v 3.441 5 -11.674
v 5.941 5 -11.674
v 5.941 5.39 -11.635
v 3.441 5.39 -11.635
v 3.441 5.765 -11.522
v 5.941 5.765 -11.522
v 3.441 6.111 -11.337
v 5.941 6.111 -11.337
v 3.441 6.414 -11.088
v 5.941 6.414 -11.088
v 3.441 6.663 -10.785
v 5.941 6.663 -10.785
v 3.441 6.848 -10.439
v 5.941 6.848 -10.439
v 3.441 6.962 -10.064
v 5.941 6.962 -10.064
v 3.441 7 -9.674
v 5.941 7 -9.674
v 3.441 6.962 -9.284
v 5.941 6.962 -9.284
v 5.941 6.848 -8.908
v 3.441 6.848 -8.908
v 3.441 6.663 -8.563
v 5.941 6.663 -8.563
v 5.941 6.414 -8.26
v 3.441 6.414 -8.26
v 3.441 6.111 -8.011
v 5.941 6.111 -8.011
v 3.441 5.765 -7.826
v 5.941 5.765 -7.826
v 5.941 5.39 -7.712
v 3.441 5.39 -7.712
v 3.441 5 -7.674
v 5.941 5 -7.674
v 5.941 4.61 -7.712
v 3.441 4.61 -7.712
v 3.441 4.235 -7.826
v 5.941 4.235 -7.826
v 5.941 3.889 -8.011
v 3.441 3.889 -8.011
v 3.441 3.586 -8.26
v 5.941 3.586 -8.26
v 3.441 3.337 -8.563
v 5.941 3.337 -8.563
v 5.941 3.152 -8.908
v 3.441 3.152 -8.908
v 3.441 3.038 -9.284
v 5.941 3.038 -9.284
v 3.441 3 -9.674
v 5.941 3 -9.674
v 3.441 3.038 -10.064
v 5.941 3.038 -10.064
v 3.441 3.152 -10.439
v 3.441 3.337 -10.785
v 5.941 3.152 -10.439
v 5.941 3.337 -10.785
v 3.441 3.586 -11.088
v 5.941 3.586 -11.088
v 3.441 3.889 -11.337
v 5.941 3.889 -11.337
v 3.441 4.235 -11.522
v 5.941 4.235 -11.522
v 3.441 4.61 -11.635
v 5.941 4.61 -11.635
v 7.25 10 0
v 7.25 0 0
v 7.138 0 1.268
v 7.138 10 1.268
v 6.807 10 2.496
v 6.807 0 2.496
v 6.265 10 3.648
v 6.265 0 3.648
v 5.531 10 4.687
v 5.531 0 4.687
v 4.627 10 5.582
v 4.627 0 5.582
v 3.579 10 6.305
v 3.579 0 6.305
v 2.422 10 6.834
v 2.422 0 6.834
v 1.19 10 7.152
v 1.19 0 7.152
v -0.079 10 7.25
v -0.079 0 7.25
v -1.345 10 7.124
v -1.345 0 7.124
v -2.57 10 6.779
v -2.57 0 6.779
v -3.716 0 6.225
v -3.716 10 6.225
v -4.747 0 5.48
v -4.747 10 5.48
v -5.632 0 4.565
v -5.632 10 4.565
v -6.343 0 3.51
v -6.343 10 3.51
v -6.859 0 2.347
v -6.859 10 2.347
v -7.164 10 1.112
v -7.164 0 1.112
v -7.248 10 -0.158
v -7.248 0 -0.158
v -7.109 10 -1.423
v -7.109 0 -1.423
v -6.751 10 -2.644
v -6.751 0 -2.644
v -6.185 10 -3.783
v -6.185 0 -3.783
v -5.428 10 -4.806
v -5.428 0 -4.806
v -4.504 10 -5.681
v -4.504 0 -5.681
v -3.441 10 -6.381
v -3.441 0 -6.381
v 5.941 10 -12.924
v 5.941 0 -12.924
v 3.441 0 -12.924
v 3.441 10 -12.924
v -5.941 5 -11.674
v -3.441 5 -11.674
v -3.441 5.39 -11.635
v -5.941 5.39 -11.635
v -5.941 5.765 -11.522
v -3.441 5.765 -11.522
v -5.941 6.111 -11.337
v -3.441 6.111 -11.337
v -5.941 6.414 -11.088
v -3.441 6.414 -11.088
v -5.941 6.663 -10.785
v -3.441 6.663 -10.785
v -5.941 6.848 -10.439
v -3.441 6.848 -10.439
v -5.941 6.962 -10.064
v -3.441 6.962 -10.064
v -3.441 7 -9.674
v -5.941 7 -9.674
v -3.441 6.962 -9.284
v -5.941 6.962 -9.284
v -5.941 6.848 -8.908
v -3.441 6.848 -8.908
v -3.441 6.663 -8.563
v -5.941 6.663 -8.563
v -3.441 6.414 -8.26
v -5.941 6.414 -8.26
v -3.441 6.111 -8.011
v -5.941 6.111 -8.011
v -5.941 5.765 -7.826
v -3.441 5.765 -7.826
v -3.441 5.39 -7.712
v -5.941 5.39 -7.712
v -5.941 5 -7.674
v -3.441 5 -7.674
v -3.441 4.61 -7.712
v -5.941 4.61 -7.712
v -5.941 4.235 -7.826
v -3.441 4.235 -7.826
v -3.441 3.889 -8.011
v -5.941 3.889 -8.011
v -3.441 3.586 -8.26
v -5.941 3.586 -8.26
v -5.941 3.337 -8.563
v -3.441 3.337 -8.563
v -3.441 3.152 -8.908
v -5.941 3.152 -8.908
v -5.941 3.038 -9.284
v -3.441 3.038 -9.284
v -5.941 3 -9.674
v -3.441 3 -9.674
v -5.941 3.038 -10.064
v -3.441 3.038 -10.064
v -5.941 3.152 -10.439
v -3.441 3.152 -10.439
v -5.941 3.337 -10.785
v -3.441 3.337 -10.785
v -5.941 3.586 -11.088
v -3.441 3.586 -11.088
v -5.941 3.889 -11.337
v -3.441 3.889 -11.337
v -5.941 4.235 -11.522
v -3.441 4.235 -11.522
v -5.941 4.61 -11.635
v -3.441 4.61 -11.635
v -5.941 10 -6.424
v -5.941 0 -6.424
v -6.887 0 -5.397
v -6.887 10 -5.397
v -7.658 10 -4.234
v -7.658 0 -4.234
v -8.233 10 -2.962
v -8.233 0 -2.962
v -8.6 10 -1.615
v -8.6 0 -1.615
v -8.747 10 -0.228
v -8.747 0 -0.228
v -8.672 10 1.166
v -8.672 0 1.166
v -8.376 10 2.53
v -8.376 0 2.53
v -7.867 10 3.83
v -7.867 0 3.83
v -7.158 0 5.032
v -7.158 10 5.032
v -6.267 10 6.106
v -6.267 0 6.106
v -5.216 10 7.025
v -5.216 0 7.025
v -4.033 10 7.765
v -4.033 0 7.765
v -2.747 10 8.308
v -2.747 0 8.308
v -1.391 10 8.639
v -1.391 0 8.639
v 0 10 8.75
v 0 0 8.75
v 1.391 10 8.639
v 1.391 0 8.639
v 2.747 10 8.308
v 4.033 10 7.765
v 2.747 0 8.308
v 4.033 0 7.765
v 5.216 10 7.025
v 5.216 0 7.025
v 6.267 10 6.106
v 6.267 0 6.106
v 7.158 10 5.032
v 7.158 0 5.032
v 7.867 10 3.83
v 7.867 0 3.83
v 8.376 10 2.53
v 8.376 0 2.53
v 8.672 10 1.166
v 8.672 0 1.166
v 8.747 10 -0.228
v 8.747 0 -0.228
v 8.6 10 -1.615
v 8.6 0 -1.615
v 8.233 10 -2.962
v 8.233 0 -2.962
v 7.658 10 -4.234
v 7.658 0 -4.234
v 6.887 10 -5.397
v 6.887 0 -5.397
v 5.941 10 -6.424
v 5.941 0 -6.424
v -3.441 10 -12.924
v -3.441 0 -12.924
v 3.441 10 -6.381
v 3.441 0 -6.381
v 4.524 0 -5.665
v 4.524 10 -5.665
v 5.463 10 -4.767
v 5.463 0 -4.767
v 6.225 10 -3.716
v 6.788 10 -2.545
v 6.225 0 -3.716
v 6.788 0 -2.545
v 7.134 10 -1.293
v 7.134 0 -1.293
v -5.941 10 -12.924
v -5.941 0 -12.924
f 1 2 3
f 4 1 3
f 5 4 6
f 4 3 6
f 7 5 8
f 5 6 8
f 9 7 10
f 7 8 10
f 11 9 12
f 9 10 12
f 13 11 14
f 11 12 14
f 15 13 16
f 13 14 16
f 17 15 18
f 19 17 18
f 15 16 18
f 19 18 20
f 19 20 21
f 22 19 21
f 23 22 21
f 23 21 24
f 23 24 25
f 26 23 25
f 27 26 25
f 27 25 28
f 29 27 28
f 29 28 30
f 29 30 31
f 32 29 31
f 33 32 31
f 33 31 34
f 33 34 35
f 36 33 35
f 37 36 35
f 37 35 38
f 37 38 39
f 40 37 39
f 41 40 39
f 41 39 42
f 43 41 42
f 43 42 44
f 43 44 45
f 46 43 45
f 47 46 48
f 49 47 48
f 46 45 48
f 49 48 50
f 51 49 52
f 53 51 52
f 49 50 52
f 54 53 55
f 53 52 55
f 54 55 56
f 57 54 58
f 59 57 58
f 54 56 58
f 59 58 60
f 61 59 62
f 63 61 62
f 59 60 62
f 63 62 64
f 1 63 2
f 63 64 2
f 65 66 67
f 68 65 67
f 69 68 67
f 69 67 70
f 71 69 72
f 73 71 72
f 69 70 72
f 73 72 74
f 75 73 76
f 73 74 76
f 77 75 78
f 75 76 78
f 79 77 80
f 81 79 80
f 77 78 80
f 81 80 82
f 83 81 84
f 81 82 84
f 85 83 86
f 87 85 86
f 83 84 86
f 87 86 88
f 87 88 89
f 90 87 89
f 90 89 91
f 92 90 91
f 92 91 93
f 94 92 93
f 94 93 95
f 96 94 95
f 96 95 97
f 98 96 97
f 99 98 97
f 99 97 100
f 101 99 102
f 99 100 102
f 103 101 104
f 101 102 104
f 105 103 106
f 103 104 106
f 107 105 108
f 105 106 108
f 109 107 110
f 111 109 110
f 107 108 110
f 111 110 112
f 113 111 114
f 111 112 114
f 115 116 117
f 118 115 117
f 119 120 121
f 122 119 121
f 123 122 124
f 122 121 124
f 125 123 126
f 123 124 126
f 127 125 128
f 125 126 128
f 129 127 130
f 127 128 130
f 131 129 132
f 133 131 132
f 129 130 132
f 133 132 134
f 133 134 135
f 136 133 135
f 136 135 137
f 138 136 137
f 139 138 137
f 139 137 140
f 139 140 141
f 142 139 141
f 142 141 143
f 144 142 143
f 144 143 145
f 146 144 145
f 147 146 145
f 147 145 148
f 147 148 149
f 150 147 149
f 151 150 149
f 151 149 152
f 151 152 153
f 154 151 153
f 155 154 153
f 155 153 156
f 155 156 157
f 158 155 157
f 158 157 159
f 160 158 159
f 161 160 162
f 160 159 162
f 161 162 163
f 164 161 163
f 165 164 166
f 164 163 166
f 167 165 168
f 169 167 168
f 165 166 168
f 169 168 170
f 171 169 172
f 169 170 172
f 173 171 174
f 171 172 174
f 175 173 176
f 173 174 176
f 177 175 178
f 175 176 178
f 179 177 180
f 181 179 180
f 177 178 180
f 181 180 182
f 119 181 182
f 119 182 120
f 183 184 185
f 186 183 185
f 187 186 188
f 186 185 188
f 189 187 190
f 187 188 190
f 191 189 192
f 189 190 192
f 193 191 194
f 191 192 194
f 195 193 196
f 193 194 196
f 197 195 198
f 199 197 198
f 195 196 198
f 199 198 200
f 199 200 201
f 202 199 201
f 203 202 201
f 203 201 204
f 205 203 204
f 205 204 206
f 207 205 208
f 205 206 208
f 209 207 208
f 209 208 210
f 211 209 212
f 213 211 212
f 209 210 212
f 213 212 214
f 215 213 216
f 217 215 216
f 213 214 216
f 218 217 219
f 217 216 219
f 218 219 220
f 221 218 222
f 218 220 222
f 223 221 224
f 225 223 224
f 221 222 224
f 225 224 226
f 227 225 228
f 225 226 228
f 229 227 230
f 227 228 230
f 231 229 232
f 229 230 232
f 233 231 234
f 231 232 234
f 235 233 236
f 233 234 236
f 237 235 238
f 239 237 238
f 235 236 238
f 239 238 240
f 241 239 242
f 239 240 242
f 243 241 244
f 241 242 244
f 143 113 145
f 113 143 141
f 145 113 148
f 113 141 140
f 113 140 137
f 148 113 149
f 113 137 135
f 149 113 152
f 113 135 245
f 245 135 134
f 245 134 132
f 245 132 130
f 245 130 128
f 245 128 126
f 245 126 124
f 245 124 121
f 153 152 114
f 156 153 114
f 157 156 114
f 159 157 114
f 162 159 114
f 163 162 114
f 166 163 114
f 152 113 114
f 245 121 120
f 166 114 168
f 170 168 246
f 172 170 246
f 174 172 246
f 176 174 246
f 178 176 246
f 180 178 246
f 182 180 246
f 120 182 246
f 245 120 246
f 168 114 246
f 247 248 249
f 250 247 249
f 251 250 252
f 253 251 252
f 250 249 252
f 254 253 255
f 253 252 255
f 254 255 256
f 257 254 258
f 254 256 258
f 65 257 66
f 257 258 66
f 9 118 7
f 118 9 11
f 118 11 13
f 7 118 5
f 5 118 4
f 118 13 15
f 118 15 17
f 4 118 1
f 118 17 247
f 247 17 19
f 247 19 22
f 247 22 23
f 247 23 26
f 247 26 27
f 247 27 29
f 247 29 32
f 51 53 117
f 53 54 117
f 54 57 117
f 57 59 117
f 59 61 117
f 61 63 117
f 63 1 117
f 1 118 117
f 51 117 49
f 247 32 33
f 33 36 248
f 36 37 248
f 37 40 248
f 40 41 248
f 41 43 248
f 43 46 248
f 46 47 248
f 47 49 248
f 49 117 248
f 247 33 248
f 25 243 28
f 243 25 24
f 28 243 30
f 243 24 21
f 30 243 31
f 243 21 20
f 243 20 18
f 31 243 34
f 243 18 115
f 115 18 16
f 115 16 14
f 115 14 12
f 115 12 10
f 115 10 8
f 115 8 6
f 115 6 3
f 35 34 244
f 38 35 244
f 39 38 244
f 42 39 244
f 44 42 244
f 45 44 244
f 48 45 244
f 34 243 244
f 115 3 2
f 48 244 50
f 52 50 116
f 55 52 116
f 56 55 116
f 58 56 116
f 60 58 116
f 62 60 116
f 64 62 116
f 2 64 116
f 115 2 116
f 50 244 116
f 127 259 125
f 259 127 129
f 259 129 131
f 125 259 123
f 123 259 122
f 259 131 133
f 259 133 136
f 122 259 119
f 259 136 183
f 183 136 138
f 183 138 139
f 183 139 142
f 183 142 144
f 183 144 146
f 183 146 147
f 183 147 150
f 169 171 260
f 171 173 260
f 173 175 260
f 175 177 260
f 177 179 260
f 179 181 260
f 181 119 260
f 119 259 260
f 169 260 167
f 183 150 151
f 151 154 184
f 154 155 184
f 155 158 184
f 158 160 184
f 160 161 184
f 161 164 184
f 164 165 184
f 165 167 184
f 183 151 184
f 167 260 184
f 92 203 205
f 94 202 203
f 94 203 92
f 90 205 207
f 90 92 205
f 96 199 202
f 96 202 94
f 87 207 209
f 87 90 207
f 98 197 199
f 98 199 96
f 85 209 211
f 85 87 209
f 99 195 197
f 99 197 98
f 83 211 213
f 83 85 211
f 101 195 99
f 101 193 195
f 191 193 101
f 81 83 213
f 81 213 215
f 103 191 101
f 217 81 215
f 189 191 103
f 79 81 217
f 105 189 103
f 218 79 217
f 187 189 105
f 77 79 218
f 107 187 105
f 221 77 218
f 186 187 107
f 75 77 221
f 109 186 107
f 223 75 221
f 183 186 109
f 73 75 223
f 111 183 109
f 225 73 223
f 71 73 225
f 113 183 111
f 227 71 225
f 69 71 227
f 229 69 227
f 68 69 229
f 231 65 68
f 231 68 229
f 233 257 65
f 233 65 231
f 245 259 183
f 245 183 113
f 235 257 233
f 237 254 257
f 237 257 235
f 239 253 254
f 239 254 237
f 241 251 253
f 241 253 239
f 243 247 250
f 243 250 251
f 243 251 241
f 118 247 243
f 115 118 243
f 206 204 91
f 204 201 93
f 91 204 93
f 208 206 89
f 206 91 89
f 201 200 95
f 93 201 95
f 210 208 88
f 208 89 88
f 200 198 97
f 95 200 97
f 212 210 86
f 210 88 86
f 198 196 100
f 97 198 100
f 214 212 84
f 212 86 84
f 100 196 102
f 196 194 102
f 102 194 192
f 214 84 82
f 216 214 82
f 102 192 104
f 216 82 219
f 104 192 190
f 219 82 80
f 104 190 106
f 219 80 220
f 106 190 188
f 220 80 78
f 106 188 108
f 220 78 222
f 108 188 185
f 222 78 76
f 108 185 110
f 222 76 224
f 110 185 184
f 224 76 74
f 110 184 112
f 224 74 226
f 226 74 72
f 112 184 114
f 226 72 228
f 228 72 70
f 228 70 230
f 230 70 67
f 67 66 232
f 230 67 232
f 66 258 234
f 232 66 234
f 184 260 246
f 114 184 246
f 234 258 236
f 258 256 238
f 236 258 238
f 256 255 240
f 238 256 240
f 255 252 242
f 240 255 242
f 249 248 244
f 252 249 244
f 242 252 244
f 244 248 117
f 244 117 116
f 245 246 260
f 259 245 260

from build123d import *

# Parameters (mm, degrees)
BOSS_EXTRUDE1_DEPTH = 10
SKETCH2_R           = 2
CUT_EXTRUDE1_DEPTH  = 22.973952412


with BuildPart() as part:
    # Sketch1 → Boss-Extrude1 (new body)
    with BuildSketch(Plane(origin=(0, 0, 0), x_dir=(1, 0, 0), z_dir=(0, 1, 0))):
        with BuildLine():
            Line((-5.941155294, 12.923797457), (-5.941155294, 6.423797457))
            ThreePointArc((-5.941155294, 6.423797457), (0, -8.75), (5.941155294, 6.423797457))
            Line((5.941155294, 6.423797457), (5.941155294, 12.923797457))
            Line((5.941155294, 12.923797457), (3.441155294, 12.923797457))
            Line((3.441155294, 12.923797457), (3.441155294, 8.044933203))
            Line((3.441155294, 8.044933203), (3.441155294, 6.381296909))
            ThreePointArc((3.441155294, 6.381296909), (6.22538657, 3.715785524), (7.25, 0))
            ThreePointArc((7.25, 0), (-3.715785524, -6.22538657), (-3.441155294, 6.381296909))
            Line((-3.441155294, 6.381296909), (-3.441155294, 8.044933203))
            Line((-3.441155294, 8.044933203), (-3.441155294, 12.923797457))
            Line((-3.441155294, 12.923797457), (-5.941155294, 12.923797457))
        make_face()
    extrude(amount=BOSS_EXTRUDE1_DEPTH)

    # Sketch2 → Cut-Extrude1 (cut, through all)
    with BuildSketch(Plane(origin=(5.941155294, 0, 0), x_dir=(0, 0, -1), z_dir=(1, 0, 0))):
        with Locations((9.673797457, 5)):
            Circle(SKETCH2_R)
    extrude(amount=-CUT_EXTRUDE1_DEPTH, mode=Mode.SUBTRACT)


solid = part.part
